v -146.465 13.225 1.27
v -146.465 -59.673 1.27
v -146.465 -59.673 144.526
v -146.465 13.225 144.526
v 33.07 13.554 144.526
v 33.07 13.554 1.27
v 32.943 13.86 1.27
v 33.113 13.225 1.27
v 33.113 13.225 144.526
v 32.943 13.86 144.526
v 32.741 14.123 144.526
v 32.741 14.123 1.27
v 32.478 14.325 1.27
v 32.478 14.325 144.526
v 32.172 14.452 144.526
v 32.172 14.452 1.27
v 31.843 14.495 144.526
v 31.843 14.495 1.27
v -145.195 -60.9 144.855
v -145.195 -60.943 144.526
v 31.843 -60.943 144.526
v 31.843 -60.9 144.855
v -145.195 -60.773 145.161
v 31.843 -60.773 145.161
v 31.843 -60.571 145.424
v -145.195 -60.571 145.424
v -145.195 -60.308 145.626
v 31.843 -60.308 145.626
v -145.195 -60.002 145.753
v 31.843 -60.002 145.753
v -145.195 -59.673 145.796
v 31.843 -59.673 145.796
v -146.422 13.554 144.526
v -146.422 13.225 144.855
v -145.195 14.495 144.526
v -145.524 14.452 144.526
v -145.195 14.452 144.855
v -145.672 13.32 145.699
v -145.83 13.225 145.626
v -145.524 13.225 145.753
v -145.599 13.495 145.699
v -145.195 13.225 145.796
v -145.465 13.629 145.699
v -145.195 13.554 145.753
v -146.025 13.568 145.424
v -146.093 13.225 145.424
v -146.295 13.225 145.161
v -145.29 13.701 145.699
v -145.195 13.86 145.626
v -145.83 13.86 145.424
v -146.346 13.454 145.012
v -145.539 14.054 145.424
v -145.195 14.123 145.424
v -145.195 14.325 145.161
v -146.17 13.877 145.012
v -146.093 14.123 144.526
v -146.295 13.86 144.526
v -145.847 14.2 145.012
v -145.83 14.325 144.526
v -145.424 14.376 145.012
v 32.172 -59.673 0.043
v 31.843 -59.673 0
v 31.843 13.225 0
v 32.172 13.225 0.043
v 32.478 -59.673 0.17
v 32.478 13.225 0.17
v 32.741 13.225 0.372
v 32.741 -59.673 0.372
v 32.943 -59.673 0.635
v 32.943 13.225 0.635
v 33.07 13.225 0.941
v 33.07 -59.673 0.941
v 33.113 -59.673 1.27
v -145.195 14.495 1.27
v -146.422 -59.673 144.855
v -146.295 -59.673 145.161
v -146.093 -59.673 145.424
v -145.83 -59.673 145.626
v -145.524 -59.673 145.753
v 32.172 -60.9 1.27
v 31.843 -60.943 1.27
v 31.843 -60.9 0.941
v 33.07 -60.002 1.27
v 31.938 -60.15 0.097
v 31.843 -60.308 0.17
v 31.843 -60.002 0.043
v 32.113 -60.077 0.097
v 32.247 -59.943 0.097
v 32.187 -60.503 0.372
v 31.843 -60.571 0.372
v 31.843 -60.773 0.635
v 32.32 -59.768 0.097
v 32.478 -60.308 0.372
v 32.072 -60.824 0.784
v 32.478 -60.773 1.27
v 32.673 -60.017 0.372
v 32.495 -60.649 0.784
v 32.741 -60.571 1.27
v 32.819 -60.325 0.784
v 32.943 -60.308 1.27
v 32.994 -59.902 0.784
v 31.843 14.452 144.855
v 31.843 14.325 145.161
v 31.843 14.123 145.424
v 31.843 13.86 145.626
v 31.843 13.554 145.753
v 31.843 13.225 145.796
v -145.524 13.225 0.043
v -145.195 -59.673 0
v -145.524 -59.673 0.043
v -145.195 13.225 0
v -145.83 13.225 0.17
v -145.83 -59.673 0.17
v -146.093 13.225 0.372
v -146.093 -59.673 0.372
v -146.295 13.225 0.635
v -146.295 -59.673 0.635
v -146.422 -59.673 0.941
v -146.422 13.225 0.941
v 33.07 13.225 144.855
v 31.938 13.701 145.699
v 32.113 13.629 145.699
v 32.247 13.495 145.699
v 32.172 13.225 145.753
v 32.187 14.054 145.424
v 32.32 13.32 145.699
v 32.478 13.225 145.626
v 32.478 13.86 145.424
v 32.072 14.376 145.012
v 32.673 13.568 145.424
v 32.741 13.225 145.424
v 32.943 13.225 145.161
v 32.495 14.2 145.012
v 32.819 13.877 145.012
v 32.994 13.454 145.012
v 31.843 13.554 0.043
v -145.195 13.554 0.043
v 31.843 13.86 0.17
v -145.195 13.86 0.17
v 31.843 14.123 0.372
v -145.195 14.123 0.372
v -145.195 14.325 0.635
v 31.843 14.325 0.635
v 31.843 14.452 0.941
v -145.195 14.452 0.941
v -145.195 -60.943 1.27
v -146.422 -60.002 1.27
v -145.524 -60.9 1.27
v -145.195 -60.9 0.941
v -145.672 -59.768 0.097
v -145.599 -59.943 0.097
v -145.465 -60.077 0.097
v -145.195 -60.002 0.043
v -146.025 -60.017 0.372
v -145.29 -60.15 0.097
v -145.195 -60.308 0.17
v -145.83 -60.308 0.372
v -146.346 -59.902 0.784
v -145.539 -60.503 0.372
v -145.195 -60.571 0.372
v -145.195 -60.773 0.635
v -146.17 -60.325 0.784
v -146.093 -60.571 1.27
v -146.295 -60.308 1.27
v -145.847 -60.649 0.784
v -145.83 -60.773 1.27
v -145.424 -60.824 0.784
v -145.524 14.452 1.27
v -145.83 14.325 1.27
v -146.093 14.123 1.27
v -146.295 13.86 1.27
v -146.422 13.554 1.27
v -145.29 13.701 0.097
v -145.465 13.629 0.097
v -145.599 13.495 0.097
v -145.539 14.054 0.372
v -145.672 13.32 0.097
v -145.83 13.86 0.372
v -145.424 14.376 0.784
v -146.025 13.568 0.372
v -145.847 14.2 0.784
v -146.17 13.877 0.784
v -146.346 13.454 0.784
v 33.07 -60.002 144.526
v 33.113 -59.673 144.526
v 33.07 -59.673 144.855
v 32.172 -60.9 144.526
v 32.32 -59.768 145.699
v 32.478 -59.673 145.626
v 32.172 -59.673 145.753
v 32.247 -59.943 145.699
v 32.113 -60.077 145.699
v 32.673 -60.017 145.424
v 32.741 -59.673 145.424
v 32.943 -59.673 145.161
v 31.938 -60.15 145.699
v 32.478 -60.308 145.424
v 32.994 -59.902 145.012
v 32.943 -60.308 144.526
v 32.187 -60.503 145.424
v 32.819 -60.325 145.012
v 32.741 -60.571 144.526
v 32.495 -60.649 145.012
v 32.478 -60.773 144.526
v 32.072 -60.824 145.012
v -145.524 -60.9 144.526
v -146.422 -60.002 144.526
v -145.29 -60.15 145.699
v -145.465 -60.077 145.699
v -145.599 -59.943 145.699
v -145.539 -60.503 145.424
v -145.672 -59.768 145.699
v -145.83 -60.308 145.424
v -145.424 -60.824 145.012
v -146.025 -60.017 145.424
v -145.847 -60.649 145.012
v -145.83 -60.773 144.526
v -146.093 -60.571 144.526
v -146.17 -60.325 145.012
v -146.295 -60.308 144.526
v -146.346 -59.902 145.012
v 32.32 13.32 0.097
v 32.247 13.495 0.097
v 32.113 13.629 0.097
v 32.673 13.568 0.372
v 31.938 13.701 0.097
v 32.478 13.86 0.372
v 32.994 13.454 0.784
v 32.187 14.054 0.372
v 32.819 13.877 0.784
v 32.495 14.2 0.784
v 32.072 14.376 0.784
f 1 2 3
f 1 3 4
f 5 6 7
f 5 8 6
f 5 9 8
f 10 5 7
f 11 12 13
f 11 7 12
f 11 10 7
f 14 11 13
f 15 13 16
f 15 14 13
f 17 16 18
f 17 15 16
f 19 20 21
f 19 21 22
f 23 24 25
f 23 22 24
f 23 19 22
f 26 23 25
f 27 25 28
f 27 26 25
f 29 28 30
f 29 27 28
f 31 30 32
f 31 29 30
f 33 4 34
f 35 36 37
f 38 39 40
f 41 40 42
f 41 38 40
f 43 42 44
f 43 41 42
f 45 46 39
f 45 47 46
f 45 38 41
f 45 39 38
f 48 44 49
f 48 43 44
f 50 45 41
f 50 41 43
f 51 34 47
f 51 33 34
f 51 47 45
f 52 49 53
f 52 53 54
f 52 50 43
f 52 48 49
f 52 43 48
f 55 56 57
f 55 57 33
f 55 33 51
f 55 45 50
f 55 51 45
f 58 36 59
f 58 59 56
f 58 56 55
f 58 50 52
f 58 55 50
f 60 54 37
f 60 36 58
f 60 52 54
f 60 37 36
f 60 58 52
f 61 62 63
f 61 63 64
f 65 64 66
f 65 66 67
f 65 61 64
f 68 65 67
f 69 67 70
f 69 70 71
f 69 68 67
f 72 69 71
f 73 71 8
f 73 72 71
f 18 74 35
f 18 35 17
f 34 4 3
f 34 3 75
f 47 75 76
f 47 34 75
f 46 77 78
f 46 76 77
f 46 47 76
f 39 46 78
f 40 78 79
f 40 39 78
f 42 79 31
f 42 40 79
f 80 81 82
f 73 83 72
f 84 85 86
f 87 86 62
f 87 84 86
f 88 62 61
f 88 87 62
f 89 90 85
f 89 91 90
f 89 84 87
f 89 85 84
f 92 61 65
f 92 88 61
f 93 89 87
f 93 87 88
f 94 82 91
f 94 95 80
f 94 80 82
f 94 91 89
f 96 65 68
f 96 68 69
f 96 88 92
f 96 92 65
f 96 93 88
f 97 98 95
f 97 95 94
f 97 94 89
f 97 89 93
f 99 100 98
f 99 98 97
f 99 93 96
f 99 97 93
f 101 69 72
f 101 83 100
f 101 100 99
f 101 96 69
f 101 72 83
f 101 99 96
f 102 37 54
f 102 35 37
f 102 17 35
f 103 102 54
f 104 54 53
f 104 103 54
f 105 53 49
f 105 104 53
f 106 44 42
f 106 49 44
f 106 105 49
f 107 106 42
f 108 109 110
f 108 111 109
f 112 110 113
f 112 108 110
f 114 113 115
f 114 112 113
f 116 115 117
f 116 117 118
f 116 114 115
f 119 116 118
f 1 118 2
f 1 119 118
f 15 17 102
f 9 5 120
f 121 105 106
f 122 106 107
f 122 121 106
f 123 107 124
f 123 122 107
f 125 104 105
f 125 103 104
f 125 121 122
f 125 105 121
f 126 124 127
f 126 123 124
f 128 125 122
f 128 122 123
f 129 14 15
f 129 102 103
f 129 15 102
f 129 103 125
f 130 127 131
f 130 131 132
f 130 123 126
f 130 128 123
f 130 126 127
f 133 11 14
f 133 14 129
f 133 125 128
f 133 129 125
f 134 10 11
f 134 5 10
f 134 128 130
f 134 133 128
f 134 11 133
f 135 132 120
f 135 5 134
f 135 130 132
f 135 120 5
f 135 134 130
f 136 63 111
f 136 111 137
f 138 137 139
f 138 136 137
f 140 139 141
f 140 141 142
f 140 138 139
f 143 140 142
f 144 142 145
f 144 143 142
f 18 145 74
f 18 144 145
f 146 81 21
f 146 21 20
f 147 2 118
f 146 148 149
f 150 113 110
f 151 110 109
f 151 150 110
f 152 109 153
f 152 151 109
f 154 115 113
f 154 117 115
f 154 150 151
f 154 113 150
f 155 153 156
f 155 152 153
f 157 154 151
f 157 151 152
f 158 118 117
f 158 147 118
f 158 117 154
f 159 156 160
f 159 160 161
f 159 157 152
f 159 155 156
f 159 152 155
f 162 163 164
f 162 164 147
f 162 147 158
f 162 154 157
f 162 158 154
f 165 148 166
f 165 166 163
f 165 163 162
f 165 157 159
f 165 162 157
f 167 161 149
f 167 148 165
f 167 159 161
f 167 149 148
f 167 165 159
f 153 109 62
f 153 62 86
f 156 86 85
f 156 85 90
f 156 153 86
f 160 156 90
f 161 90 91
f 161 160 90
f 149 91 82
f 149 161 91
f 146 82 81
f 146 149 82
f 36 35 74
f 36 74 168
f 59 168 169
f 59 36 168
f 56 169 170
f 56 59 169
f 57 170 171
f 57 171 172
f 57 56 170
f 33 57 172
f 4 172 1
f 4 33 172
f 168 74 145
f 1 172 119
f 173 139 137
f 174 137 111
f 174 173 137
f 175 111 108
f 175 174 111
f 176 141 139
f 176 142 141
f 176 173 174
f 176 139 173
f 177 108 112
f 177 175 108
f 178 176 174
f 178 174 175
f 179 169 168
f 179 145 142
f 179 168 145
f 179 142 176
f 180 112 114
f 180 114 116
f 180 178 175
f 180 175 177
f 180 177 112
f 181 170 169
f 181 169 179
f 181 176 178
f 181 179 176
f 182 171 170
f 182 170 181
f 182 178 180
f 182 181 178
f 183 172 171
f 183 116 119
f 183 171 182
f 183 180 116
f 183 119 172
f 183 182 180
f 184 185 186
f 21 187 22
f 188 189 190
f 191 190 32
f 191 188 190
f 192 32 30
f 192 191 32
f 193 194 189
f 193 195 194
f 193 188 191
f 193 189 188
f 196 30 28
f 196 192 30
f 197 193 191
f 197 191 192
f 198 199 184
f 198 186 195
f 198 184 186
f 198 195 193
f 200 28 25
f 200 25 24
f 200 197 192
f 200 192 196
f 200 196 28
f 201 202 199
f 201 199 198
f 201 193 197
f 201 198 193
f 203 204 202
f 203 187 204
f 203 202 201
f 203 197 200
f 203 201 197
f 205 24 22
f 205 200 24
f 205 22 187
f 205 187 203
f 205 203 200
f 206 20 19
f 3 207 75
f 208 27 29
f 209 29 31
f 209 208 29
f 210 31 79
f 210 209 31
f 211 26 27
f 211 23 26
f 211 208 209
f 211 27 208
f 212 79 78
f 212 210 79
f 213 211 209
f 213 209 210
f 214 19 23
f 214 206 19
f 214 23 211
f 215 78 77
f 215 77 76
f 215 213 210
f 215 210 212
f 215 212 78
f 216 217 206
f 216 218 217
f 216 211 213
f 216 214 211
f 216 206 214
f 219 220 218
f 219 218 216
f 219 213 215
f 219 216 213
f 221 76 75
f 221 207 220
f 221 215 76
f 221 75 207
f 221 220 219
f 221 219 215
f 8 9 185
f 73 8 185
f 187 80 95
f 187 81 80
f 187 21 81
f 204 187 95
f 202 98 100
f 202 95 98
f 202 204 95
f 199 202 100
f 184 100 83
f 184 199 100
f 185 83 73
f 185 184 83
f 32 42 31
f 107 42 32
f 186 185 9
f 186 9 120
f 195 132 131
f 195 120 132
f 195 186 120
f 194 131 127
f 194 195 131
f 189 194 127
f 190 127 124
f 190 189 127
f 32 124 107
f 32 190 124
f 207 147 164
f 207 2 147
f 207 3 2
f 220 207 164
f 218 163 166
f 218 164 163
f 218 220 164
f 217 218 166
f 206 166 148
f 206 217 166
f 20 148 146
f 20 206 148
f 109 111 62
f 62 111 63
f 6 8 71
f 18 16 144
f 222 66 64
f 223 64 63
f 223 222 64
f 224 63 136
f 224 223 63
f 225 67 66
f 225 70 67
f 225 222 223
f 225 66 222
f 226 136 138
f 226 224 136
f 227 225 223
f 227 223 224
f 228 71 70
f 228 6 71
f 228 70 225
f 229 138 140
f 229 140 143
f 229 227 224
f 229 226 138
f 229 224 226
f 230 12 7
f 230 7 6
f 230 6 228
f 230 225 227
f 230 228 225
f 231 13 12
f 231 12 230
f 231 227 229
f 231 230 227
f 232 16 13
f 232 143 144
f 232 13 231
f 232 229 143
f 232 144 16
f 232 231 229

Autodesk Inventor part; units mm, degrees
ref_plane "YZ Plane" through (0, 0, 0) normal (1, 0, 0) x (0, 1, 0)
ref_plane "XZ Plane" through (0, 0, 0) normal (0, 1, 0) x (-1, 0, 0)
ref_plane "XY Plane" through (0, 0, 0) normal (0, 0, 1) x (1, 0, 0)
sketch "Sketch1" plane through (0, 0, 0) normal (0, 0, 1) x (1, 0, 0)
  line L0 (-146.4649, 14.4948) -> (33.1131, 14.4948)
  line L1 (33.1131, 14.4948) -> (33.1131, -60.9432)
  line L2 (33.1131, -60.9432) -> (-146.4649, -60.9432)
  line L3 (-146.4649, -60.9432) -> (-146.4649, 14.4948)
  line L4 (30.5731, 14.7488) -> (-143.9249, 14.7488) projected
  line L5 (-143.9249, -61.1972) -> (30.5731, -61.1972) projected
  line L6 (-147.2269, 11.4468) -> (-147.2269, -57.8952) projected
  point P0 (0, 0)
  point P1 (-146.4649, -23.2242)
  point P2 (-147.2269, -23.2242)
  point P3 (-56.6759, 14.4948)
  point P4 (-56.6759, 14.7488)
  dimension "d0" = 179.578
  dimension "d1" = 75.438
extrude "Extrusion1" add sketch "Sketch1" along normal blind 145.796
fillet "Fillet1" radius 1.27 12 edges at (-146.4649, 14.4948, 72.898) (33.1131, 14.4948, 72.898) (-56.6759, 14.4948, 0) (-56.6759, 14.4948, 145.796) (33.1131, -60.9432, 72.898) (33.1131, -23.2242, 0) (33.1131, -23.2242, 145.796) (-146.4649, -60.9432, 72.898) (-56.6759, -60.9432, 0) (-56.6759, -60.9432, 145.796) (-146.4649, -23.2242, 0) (-146.4649, -23.2242, 145.796)
properties part number "Electrical_Yuasa_Np18-12_Middle"
